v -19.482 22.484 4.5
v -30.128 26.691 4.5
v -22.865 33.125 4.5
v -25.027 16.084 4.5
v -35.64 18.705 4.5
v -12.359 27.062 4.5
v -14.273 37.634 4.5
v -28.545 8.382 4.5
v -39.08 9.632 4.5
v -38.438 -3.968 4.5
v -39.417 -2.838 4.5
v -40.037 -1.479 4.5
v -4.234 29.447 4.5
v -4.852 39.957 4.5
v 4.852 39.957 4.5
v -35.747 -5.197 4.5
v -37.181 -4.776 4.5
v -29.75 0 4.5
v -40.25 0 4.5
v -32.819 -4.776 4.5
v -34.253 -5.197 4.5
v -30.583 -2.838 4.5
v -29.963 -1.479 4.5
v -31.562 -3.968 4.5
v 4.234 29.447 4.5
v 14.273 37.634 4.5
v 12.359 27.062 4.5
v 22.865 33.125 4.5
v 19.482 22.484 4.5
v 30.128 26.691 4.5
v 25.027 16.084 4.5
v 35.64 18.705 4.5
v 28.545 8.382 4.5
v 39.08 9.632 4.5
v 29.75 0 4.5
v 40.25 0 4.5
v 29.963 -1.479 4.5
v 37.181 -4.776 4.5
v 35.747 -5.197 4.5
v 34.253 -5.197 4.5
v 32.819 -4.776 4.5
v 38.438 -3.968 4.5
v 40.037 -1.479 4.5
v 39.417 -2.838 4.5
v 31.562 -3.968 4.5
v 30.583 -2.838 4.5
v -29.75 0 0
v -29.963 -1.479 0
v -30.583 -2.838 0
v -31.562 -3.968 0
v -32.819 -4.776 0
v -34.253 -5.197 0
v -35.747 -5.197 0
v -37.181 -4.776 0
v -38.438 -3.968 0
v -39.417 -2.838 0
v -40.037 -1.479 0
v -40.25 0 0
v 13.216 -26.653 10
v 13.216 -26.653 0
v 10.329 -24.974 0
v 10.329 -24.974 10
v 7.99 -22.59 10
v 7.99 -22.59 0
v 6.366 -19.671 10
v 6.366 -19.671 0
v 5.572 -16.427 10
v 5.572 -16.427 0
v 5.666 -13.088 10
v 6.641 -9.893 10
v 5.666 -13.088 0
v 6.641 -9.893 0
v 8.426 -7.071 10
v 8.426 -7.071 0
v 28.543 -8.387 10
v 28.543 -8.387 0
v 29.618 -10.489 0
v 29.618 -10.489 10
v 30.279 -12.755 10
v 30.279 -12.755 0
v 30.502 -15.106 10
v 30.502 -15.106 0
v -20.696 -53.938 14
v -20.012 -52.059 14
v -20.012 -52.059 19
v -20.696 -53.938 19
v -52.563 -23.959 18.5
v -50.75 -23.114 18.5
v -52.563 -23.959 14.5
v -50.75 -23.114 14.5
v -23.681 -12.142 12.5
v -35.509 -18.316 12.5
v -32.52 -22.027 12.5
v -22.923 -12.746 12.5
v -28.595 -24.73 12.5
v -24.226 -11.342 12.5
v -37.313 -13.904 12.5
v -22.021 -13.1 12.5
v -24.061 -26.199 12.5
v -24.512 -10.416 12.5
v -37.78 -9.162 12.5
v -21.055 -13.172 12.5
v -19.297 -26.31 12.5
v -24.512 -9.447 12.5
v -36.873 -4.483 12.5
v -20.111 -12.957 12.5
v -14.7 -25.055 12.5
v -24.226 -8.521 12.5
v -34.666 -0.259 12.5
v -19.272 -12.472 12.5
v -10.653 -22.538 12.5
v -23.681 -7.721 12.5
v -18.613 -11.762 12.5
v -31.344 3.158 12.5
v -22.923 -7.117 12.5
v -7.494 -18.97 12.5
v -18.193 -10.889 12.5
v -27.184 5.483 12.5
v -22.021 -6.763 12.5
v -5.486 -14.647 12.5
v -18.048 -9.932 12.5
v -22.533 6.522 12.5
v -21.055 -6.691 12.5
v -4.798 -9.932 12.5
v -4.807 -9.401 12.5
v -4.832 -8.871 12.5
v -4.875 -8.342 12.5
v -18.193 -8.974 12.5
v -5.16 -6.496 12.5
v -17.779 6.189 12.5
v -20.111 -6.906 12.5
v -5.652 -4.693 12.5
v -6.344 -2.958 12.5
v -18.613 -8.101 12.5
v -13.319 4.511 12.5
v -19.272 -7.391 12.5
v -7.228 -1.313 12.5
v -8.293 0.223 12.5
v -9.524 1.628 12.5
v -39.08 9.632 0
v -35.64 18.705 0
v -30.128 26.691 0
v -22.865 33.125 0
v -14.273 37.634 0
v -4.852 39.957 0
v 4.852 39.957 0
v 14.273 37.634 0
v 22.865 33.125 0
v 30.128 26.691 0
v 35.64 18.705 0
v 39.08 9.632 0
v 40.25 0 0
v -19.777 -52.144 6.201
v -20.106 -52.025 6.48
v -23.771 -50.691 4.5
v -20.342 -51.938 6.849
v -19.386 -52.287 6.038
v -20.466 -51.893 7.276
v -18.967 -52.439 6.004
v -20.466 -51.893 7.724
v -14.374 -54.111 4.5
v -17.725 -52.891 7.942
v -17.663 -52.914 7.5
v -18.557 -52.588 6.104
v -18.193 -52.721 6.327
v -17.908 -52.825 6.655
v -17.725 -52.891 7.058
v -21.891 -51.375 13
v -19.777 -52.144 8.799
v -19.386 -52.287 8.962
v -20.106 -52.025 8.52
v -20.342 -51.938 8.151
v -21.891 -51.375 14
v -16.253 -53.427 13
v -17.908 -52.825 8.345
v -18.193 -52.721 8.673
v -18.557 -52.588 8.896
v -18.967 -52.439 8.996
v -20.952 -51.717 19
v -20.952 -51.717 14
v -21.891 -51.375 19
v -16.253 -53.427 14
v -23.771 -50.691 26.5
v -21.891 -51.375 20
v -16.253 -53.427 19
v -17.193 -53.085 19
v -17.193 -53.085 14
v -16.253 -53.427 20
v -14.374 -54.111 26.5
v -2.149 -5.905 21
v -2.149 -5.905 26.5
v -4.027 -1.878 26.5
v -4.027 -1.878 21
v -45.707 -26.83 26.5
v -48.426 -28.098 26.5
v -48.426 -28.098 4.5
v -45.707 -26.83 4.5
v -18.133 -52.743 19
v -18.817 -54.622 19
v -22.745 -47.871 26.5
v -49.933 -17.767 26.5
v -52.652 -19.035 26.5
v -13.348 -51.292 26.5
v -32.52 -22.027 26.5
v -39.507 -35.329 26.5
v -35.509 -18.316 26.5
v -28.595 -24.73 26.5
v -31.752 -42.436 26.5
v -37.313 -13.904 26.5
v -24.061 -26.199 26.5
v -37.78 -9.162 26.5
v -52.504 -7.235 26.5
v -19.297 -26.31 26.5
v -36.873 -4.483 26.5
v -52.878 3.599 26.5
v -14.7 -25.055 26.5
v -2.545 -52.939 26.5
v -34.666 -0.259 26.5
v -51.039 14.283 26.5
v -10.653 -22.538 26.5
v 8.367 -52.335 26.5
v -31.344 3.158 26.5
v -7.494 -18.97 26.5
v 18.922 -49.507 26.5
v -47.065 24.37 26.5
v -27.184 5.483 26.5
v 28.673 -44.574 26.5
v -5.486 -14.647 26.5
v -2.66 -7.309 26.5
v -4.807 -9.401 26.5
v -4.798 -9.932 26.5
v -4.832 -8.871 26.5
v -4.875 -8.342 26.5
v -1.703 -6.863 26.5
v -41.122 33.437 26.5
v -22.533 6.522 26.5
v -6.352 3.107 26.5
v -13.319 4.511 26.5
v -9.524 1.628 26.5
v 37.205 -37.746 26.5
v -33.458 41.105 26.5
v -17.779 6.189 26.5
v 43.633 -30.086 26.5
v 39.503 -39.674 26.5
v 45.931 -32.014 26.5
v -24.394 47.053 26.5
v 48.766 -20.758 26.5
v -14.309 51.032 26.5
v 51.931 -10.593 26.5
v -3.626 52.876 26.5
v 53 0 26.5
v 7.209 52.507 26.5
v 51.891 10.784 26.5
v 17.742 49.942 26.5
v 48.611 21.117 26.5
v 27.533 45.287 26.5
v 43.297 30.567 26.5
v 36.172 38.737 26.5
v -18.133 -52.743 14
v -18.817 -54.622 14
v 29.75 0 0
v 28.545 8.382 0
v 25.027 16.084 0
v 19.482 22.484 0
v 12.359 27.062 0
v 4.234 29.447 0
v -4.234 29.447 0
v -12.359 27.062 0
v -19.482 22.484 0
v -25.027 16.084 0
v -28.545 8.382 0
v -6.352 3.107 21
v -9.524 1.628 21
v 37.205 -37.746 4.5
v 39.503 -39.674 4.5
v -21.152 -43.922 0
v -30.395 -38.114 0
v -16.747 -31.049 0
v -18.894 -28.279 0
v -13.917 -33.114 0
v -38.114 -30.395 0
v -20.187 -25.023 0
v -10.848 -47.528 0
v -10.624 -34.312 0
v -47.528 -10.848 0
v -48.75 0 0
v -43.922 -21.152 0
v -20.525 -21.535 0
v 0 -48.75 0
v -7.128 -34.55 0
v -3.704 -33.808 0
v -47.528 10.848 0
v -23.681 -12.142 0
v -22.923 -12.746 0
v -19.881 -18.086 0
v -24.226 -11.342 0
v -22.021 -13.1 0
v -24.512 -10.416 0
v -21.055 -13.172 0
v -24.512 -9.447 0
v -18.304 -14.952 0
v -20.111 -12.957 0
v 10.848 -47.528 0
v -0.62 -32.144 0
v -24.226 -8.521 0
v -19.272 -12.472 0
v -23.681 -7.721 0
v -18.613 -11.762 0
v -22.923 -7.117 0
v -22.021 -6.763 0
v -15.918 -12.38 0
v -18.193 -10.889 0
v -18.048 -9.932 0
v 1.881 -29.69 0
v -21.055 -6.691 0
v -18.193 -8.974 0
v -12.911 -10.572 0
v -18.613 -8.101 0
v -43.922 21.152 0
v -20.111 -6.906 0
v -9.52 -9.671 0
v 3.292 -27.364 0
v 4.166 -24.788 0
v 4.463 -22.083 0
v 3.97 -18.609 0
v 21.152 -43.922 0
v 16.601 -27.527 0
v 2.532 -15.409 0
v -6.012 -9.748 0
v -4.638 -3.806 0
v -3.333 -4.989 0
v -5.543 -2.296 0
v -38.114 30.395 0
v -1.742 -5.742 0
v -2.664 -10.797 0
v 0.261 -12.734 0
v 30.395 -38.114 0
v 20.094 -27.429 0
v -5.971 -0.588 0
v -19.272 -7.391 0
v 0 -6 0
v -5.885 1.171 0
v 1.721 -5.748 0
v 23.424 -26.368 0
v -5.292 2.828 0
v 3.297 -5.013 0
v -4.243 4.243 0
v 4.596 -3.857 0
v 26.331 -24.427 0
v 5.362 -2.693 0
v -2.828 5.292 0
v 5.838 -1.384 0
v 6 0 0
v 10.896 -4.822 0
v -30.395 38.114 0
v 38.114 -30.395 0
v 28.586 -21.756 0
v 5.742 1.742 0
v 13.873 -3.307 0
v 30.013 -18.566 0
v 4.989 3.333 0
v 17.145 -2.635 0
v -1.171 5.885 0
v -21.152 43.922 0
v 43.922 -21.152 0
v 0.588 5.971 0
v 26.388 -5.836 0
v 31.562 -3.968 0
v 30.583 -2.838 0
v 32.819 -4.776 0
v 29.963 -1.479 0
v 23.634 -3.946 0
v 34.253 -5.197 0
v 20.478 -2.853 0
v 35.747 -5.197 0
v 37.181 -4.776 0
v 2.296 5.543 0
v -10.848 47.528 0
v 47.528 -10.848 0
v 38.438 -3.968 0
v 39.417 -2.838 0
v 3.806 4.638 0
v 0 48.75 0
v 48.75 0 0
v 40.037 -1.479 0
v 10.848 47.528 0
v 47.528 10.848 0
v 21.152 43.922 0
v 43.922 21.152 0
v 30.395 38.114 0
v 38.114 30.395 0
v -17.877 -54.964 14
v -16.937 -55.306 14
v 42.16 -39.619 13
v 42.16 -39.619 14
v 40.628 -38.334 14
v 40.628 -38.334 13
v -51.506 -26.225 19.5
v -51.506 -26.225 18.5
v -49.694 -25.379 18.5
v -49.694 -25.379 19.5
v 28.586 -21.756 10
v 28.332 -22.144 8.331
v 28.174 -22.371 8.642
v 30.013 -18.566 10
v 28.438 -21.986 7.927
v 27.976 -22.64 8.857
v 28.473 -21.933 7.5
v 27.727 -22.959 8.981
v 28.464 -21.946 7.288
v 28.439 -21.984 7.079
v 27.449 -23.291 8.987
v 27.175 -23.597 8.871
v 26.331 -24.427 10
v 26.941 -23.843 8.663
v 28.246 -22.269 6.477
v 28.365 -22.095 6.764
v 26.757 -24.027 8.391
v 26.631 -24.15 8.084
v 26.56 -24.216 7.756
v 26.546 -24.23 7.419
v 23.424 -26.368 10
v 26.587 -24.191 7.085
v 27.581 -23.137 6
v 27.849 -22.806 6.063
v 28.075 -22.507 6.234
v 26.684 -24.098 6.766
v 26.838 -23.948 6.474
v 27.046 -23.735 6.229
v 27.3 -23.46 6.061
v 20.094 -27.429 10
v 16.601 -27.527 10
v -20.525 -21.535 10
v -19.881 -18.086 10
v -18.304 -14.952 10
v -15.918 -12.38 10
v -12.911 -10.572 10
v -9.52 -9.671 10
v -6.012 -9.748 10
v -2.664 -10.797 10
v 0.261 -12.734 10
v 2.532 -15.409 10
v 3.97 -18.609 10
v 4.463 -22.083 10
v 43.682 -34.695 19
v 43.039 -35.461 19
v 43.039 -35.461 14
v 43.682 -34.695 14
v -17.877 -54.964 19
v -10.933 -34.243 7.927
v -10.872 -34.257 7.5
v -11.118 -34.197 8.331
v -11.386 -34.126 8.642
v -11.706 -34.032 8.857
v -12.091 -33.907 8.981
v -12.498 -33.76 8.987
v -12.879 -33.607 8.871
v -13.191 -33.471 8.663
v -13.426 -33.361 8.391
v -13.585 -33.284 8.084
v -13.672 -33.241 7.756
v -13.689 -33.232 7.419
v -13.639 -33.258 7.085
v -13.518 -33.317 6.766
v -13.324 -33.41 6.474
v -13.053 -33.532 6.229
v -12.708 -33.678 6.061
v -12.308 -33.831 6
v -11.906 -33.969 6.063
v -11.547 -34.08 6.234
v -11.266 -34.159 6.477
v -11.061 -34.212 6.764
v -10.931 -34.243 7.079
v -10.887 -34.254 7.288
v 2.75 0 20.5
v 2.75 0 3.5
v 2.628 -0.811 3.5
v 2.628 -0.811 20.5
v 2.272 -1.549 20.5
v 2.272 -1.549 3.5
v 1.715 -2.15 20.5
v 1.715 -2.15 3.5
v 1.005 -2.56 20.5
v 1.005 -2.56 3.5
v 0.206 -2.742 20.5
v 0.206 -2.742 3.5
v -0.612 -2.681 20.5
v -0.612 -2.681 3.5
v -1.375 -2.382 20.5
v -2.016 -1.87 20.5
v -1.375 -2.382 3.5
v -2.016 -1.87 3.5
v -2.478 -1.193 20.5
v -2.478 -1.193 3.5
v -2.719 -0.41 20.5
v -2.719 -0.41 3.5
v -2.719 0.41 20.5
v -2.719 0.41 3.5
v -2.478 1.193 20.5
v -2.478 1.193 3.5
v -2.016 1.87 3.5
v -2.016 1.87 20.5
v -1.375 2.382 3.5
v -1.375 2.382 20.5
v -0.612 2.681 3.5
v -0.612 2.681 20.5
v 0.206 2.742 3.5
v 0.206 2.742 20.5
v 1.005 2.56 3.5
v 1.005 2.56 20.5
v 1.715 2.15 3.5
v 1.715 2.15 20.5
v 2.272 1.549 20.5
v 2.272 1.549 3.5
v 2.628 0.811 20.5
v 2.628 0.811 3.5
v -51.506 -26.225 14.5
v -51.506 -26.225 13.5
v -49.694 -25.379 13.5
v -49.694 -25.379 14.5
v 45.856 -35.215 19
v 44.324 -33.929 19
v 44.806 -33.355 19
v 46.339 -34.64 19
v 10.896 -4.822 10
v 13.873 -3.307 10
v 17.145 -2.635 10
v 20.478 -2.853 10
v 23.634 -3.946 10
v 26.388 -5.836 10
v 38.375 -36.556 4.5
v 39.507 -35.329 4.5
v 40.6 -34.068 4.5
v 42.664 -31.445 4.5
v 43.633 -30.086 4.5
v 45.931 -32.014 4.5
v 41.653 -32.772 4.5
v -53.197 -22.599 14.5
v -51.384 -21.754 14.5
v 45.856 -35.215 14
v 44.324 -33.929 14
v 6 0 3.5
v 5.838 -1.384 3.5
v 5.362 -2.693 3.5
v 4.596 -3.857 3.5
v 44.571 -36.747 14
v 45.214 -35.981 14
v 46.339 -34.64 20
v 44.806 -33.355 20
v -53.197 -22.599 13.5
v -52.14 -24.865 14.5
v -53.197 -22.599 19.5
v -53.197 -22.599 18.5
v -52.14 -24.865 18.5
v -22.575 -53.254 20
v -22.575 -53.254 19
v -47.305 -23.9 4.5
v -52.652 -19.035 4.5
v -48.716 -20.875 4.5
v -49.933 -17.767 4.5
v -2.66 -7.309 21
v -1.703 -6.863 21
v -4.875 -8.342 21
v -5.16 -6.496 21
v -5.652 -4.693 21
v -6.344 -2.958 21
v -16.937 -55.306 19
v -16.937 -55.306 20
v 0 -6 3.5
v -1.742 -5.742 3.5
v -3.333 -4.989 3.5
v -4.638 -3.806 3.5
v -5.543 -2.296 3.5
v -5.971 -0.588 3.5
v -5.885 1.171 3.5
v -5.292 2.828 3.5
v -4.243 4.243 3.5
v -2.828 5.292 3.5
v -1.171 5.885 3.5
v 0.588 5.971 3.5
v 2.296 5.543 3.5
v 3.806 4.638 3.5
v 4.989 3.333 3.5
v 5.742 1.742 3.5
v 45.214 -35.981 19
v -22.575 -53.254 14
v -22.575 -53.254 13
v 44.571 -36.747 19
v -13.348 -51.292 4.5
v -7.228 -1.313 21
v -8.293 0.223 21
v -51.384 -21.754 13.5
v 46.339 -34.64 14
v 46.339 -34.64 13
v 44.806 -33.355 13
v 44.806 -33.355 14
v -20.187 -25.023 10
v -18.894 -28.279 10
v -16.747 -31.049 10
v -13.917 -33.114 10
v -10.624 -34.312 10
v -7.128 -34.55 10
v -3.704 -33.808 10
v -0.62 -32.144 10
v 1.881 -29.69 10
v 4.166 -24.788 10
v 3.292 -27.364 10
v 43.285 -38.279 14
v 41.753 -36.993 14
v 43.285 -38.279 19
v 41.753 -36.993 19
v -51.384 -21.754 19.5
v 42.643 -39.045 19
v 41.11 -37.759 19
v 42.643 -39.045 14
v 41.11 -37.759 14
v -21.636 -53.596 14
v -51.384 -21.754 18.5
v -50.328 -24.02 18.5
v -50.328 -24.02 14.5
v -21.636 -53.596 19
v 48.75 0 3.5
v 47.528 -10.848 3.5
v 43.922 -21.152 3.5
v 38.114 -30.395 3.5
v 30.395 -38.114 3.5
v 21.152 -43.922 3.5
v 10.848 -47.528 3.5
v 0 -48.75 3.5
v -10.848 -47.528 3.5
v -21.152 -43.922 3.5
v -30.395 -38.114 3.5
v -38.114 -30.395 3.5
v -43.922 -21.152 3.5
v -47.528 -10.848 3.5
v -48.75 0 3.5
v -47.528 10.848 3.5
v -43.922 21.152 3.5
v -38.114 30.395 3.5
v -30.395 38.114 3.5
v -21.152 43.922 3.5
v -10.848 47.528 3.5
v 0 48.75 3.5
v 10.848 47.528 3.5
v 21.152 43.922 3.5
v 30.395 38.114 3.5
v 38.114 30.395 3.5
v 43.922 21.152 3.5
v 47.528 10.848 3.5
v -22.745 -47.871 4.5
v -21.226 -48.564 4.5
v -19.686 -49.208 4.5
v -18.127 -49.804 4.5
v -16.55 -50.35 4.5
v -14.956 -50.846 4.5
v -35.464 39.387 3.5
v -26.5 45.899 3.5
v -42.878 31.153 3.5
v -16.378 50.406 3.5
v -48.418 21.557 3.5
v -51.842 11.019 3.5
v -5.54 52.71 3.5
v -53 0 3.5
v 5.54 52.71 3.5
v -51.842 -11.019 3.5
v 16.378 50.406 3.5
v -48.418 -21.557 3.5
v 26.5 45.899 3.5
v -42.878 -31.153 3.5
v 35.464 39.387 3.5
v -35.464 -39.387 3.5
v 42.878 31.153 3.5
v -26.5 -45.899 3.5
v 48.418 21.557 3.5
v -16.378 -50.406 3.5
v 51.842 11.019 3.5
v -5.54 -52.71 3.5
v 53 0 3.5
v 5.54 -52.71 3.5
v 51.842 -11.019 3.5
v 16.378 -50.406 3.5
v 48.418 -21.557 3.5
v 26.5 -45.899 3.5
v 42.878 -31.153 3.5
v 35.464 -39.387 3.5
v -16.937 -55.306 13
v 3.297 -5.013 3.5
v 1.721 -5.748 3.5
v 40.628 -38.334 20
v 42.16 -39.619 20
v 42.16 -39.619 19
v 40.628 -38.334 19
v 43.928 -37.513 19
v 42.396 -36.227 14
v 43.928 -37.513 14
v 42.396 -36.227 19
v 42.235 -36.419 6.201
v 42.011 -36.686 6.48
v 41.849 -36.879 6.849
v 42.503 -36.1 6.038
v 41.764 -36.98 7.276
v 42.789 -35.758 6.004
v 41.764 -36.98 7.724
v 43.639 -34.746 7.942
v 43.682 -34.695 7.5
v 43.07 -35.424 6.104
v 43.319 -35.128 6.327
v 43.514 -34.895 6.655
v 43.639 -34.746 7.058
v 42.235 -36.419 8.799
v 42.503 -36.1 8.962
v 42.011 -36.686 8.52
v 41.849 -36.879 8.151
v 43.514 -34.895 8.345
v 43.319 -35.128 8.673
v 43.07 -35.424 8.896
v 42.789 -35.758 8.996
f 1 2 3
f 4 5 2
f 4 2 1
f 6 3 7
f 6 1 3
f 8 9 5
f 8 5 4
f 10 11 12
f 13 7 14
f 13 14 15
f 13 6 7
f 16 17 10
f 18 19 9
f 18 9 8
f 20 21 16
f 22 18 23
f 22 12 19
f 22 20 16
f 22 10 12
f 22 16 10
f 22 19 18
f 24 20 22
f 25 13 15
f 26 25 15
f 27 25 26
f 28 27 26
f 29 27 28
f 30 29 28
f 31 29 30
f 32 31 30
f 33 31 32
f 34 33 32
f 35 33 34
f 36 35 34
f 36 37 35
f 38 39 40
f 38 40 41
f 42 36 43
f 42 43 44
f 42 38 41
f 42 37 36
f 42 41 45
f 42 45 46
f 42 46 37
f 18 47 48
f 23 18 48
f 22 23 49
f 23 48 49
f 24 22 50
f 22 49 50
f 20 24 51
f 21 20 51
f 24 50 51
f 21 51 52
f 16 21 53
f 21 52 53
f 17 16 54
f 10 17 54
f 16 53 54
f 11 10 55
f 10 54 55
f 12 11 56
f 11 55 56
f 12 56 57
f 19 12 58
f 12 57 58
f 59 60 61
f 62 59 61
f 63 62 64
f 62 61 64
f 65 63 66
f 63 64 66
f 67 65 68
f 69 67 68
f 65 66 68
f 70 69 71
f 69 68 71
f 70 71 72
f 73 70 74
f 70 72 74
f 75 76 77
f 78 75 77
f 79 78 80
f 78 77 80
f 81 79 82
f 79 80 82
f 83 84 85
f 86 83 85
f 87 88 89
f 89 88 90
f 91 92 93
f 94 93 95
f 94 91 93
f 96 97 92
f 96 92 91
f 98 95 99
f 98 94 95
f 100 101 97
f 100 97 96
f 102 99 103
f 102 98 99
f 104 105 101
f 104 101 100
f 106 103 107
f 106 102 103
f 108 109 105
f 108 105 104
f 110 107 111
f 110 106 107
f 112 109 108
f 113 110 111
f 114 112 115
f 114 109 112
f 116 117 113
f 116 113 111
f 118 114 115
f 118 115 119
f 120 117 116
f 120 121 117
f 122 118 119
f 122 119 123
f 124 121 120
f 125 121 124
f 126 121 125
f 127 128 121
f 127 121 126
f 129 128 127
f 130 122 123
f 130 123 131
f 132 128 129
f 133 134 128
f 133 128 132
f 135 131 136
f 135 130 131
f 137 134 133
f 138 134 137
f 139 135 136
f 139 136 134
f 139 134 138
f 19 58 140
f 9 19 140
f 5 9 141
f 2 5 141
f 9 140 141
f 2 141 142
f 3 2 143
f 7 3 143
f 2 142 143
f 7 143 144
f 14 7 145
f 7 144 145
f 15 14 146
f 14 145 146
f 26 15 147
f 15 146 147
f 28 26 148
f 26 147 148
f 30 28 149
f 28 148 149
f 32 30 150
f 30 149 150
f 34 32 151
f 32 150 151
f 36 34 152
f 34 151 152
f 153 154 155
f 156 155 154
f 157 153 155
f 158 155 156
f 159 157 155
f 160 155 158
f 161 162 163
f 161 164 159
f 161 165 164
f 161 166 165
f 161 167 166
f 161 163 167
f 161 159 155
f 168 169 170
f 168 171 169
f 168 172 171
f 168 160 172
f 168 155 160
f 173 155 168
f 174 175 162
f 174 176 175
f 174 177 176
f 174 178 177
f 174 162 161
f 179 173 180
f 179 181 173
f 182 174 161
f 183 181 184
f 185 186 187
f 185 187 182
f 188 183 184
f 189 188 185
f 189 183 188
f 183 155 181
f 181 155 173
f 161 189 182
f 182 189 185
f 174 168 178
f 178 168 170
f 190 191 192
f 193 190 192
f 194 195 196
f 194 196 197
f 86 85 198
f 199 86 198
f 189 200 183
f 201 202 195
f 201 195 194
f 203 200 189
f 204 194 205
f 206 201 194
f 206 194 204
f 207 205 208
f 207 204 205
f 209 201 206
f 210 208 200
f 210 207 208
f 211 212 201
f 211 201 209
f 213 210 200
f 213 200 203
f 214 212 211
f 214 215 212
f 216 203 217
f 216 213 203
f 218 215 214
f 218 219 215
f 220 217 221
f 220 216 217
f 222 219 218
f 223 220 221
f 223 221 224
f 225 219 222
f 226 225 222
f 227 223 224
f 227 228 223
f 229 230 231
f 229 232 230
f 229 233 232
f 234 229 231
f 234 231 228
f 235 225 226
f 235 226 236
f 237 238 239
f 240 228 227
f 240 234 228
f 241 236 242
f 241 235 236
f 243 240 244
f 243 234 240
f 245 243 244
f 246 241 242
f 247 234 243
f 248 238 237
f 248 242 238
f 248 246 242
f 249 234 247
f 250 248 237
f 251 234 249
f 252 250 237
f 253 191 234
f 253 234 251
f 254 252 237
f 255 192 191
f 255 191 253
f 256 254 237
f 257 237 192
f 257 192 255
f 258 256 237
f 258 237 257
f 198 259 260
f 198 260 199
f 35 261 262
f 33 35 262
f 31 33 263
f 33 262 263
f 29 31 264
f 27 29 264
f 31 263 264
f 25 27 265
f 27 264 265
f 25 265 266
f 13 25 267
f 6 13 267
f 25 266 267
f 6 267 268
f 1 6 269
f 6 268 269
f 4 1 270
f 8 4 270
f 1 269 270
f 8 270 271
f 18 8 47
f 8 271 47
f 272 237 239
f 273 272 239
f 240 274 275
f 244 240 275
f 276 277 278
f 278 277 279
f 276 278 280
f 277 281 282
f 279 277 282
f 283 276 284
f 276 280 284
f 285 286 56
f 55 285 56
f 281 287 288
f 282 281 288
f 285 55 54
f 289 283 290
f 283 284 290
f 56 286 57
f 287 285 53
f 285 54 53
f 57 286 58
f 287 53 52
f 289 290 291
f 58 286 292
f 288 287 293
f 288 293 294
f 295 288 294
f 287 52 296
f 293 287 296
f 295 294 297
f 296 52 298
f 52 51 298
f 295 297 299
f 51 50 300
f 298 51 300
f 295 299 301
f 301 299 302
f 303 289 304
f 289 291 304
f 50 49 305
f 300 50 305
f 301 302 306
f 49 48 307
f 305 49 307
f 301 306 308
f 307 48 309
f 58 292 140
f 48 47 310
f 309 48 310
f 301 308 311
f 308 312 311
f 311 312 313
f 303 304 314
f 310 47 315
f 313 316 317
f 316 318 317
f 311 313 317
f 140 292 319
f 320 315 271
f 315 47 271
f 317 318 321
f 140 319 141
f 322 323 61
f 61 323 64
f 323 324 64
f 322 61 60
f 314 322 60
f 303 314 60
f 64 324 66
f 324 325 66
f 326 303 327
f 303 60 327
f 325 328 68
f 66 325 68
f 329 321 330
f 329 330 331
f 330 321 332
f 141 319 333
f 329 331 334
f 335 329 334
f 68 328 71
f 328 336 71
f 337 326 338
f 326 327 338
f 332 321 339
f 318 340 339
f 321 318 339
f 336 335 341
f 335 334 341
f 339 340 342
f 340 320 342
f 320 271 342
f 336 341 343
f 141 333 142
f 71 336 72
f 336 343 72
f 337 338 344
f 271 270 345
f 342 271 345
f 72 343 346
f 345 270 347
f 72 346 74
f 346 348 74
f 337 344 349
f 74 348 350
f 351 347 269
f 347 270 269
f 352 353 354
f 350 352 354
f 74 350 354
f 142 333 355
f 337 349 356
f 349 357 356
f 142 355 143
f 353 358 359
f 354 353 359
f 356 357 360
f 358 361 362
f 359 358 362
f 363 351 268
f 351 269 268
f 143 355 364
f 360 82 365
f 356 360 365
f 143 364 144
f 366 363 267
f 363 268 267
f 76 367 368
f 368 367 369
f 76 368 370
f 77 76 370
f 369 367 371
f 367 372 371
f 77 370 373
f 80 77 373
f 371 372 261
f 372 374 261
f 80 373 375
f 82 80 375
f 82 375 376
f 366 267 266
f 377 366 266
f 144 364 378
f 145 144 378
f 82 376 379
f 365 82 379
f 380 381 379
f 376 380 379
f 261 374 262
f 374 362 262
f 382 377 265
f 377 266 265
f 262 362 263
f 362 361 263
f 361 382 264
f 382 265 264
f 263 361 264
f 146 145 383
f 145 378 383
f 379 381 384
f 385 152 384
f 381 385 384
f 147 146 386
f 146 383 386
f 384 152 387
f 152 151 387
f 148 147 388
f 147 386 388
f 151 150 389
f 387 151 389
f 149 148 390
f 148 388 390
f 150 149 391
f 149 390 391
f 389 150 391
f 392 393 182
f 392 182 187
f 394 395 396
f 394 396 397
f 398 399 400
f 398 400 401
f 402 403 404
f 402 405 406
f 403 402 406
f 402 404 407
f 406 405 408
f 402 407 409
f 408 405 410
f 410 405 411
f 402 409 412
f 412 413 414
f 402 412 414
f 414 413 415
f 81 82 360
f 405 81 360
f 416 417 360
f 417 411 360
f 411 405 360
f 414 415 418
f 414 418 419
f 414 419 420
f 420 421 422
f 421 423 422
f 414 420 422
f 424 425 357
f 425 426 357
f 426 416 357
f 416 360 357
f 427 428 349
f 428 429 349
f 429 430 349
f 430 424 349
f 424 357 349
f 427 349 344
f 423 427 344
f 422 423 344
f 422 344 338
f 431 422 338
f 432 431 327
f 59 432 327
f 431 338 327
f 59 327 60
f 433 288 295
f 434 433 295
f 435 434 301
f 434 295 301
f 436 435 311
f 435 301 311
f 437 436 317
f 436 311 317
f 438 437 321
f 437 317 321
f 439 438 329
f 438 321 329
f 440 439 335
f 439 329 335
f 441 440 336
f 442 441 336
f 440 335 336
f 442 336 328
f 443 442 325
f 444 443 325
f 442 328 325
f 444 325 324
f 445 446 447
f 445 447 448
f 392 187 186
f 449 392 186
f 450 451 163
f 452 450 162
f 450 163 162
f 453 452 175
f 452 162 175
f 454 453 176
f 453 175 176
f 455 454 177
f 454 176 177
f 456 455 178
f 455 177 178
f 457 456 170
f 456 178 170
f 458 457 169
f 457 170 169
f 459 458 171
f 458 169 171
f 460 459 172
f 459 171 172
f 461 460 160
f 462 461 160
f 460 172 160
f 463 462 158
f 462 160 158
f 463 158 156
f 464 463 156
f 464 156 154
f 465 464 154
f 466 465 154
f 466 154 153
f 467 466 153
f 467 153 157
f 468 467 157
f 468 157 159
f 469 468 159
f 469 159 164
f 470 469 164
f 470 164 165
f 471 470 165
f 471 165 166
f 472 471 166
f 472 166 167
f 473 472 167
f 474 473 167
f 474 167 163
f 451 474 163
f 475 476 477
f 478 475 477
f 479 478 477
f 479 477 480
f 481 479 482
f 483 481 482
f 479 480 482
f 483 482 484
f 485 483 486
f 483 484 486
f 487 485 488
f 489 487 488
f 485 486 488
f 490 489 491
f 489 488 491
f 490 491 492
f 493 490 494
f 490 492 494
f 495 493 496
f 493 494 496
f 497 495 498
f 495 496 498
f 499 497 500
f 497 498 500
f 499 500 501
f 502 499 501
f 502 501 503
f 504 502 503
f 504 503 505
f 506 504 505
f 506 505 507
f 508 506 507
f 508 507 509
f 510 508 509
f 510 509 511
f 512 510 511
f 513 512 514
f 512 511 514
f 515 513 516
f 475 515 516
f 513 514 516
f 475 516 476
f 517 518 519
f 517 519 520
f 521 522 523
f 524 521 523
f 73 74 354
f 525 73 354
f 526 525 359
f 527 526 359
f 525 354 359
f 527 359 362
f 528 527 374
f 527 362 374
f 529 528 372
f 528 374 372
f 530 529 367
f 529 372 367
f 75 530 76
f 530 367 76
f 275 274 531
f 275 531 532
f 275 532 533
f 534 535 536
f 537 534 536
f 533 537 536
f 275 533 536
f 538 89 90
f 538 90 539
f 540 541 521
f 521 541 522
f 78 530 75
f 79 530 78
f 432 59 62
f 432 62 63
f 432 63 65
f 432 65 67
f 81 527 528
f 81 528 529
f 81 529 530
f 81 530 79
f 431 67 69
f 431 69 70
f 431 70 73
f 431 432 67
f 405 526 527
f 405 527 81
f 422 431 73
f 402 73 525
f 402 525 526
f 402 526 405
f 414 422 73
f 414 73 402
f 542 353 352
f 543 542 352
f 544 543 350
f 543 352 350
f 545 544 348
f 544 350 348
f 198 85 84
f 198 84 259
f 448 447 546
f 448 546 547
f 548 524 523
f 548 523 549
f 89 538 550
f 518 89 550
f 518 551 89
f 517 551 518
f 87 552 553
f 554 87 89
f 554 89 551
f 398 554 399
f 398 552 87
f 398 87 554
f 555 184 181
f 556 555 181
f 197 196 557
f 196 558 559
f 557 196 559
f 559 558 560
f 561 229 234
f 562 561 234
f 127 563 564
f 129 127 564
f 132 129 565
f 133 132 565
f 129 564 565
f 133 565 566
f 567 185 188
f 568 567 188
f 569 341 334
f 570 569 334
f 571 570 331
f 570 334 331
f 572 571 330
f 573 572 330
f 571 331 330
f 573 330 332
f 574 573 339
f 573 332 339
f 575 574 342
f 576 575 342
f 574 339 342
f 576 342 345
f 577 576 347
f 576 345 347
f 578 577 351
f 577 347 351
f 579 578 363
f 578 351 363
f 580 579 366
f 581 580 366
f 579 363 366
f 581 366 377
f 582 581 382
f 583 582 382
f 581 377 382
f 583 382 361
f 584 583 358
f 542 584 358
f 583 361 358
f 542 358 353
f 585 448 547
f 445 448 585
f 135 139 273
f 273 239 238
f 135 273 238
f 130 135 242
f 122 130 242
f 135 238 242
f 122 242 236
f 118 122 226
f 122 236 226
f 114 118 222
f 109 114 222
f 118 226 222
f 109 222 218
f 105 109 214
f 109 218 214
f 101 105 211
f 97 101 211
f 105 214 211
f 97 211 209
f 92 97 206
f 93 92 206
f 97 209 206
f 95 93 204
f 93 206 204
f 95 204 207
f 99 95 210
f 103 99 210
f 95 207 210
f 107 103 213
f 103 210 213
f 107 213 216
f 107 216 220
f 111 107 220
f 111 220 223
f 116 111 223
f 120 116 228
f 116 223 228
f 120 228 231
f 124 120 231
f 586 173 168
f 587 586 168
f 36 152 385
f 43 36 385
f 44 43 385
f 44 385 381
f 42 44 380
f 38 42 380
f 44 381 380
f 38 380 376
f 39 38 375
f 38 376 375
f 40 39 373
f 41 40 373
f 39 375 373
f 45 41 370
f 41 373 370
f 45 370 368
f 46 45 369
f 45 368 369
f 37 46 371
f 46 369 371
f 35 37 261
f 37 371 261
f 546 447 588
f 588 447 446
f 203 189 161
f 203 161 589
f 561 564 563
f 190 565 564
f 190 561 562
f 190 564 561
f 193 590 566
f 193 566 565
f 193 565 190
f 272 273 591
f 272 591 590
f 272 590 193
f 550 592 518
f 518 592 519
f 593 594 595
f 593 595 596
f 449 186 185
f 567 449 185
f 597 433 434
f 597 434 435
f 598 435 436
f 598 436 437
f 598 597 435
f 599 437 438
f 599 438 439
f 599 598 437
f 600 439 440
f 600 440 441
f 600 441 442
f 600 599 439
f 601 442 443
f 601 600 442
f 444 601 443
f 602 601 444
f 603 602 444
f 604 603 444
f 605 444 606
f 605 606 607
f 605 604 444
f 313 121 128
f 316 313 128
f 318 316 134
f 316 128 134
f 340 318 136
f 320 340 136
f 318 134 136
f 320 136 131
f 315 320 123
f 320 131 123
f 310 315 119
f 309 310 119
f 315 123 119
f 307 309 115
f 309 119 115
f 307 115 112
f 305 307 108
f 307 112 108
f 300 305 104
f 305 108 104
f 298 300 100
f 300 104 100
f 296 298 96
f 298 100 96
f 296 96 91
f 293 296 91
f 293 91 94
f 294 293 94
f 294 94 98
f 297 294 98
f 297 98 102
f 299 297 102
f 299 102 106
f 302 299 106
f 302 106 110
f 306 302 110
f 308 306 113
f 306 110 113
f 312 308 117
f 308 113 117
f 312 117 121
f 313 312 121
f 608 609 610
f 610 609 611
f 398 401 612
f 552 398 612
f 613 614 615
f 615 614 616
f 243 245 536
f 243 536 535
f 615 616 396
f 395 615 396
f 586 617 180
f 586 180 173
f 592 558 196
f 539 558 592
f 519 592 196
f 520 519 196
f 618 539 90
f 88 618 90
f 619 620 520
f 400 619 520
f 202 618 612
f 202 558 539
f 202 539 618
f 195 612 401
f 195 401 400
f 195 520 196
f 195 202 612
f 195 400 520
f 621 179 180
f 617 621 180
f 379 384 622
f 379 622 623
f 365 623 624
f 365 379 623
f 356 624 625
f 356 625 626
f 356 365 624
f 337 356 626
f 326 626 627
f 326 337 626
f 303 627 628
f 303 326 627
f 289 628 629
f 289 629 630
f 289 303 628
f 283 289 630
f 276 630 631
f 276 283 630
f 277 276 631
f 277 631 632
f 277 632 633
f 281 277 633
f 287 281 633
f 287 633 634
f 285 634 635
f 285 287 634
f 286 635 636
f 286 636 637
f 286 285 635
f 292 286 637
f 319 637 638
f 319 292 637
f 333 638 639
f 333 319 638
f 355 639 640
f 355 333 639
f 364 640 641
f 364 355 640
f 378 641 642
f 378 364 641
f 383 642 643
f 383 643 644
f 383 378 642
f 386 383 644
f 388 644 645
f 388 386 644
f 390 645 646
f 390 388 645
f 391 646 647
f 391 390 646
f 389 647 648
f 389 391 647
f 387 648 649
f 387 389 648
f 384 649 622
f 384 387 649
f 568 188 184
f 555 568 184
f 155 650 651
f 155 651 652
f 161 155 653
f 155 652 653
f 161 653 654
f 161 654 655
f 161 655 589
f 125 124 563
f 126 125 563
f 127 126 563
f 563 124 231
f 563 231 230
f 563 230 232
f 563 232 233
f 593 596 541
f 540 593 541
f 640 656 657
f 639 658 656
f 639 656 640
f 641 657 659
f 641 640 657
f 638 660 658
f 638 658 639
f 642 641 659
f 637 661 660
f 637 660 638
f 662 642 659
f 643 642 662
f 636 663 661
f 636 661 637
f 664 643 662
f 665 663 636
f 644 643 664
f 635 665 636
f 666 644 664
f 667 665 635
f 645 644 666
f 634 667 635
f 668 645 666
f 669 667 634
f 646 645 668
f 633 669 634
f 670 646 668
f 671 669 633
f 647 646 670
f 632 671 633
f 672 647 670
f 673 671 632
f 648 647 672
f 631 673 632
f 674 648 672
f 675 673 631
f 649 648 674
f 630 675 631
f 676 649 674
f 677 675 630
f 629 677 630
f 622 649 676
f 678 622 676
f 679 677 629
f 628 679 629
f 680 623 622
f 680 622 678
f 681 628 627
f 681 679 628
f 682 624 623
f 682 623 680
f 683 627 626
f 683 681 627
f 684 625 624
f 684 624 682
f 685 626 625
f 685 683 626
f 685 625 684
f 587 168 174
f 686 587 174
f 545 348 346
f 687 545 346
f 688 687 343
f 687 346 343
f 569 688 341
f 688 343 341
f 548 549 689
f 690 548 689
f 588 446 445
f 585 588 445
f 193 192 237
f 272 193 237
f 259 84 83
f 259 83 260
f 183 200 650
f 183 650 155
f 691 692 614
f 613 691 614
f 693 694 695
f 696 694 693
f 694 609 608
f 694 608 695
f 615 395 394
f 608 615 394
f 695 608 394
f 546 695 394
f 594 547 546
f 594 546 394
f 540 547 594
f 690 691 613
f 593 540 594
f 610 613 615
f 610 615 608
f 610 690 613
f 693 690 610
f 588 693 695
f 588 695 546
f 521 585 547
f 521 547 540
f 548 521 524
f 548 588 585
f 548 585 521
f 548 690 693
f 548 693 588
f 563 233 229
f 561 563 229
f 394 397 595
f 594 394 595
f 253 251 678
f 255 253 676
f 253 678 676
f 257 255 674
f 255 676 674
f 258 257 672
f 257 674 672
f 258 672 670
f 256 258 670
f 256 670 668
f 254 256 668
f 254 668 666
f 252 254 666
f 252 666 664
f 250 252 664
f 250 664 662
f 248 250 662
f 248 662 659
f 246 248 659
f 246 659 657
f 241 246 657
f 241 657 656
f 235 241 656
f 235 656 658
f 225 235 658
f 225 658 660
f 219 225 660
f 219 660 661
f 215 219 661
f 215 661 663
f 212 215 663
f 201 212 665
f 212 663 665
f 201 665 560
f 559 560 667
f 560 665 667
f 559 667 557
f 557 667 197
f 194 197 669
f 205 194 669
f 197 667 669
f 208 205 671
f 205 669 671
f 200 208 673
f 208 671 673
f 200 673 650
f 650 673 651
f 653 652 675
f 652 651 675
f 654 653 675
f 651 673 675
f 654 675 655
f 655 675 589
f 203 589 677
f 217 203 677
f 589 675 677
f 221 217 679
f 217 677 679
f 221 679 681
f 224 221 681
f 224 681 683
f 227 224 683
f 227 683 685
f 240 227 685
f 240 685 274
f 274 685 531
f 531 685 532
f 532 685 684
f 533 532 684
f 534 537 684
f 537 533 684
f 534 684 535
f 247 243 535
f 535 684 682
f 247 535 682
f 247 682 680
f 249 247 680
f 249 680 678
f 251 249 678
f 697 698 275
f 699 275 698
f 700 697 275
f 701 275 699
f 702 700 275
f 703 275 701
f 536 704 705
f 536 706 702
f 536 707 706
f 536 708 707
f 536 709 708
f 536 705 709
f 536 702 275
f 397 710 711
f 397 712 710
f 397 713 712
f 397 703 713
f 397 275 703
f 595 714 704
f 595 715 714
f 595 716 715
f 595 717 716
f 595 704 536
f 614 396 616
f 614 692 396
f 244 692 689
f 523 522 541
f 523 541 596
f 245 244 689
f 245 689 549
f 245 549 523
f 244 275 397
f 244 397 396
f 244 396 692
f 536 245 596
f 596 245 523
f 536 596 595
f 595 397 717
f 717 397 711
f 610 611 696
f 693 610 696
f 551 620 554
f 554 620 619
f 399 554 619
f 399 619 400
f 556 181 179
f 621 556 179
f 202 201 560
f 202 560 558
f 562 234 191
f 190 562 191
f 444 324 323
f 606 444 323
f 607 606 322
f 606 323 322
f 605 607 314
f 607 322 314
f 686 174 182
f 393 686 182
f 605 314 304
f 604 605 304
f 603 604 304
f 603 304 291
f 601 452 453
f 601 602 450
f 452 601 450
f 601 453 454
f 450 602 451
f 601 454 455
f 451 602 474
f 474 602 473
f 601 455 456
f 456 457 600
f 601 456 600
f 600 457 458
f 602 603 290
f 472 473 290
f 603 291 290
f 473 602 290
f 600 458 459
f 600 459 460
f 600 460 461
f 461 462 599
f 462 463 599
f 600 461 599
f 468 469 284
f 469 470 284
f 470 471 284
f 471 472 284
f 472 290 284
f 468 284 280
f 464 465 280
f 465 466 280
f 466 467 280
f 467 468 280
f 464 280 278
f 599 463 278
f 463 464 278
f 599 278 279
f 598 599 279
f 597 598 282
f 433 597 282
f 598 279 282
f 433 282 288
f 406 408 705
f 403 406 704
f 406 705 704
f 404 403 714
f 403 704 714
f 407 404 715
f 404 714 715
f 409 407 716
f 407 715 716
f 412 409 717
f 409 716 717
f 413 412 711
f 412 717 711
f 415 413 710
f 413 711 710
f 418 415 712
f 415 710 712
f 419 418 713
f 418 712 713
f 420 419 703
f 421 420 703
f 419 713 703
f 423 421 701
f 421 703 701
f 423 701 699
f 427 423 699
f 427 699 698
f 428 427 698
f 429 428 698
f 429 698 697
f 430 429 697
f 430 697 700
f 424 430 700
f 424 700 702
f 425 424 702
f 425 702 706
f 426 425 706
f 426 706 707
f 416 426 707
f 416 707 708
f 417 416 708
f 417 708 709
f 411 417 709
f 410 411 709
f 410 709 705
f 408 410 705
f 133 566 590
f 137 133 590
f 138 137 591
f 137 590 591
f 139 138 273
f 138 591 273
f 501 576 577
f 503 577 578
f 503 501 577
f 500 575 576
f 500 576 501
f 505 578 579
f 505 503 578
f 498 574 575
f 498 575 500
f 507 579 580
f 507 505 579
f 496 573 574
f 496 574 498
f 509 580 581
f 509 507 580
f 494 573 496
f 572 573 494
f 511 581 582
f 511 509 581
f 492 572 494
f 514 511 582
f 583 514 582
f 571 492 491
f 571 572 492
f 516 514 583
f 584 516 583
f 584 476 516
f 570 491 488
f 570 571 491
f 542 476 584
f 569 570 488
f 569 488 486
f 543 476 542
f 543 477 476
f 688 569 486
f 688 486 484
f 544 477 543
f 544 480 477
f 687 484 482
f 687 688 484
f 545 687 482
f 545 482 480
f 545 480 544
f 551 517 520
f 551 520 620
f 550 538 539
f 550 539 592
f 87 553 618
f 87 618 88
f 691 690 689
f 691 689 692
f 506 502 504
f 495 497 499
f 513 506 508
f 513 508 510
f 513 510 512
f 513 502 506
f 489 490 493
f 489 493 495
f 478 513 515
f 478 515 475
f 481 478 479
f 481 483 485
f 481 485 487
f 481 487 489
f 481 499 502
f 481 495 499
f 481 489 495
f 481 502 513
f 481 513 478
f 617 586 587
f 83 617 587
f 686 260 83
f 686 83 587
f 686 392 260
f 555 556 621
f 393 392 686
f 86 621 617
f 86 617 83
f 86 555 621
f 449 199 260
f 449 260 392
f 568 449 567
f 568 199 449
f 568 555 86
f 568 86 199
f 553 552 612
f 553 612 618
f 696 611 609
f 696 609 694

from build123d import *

# Parameters (mm, degrees)
F0_R      = 53
F1_DEPTH  = 26.5
F2_R      = 53
F2_R_2    = 48.75
F3_DEPTH  = 3.5
F4_R      = 2.75
F5_DEPTH  = 17
F6_DEPTH  = 4.5
F8_DEPTH  = 14
F9_R      = 3.25
F10_DEPTH = 12.5
F11_DEPTH = 10
F12_DEPTH = 22
F13_DEPTH = 5.5
F14_R     = 1.5
F15_DEPTH = 25
F16_R     = 1.5
F17_DEPTH = 25
F19_DEPTH = 2
F14_W     = 2
F14_H     = 5
F20_DEPTH = 2
F16_W     = 1
F16_H     = 5
F21_DEPTH = 2


with BuildPart() as f1:
    # F0 (on Top) → F1 (new body)
    with BuildSketch(Plane.XY):
        Circle(F0_R)
    extrude(amount=F1_DEPTH)

    # F2 (on face) → F3 (cut)
    with BuildSketch(Plane(origin=(0, 0, 0), x_dir=(1, 0, 0), z_dir=(0, 0, -1))):
        Circle(F2_R)
        Circle(F2_R_2, mode=Mode.SUBTRACT)
        with BuildLine():
            ThreePointArc((0, 6), (-4.2426406871, -4.2426406871), (6, 0))
            ThreePointArc((6, 0), (5.6381557247, 2.05212086), (4.5962666587, 3.8567256581))
            Line((4.5962666587, 3.8567256581), (0, 0))
            Line((0, 0), (0, 6))
        make_face()
        with BuildLine():
            Line((0, 0), (4.5962666587, 3.8567256581))
            ThreePointArc((4.5962666587, 3.8567256581), (2.5357095704, 5.4378467222), (0, 6))
            Line((0, 6), (0, 0))
        make_face()
    extrude(amount=-F3_DEPTH, mode=Mode.SUBTRACT)

    # F4 (on face) → F5 (cut)
    with BuildSketch(Plane(origin=(0, 0, 3.5), x_dir=(1, 0, 0), z_dir=(0, 0, -1))):
        Circle(F4_R)
    extrude(amount=-F5_DEPTH, mode=Mode.SUBTRACT)

    # F2 (on face) → F6 (cut)
    with BuildSketch(Plane(origin=(0, 0, 0), x_dir=(1, 0, 0), z_dir=(0, 0, -1))):
        with BuildLine():
            ThreePointArc((-40.25, 5.06e-08), (-35.0000000253, -5.25), (-29.75, 0))
            ThreePointArc((-29.75, 0), (-34.9999999747, 5.25), (-40.25, 5.06e-08))
        make_face()
        with BuildLine():
            ThreePointArc((40.25, 0), (35, -5.25), (29.75, 0))
            ThreePointArc((29.75, 0), (0, -29.75), (-29.75, 0))
            ThreePointArc((-29.75, 0), (-35.0000000253, -5.25), (-40.25, 5.06e-08))
            ThreePointArc((-40.25, 5.06e-08), (-2.53e-08, -40.25), (40.25, 0))
        make_face()
        with BuildLine():
            ThreePointArc((40.25, 0), (35, 5.25), (29.75, 0))
            ThreePointArc((29.75, 0), (35, -5.25), (40.25, 0))
        make_face()
    extrude(amount=-F6_DEPTH, mode=Mode.SUBTRACT)

    # F7 (on face) → F8 (cut)
    with BuildSketch(Plane.XY.offset(26.5)):
        with BuildLine():
            ThreePointArc((-9.5237930297, 1.6275609299), (-36.5712199238, -16.1753957641), (-4.7982329954, -9.9315291509))
            ThreePointArc((-4.7982329954, -9.9315291509), (-4.8174339562, -9.1357508964), (-4.8749921506, -8.3418247275))
            ThreePointArc((-4.8749921506, -8.3418247275), (-5.3803326375, -5.587516237), (-6.3441545093, -2.9583278322))
            ThreePointArc((-6.3441545093, -2.9583278322), (-7.7386969196, -0.529987713), (-9.5237930297, 1.6275609299))
        make_face()
    extrude(amount=-F8_DEPTH, mode=Mode.SUBTRACT)

    # F9 (on face) → F10 (cut)
    with BuildSketch(Plane.XY.offset(12.5)):
        with Locations((-21.2982329954, -9.9315291509)):
            Circle(F9_R)
    extrude(amount=-F10_DEPTH, mode=Mode.SUBTRACT)

    # F2 (on face) → F11 (cut)
    with BuildSketch(Plane(origin=(0, 0, 0), x_dir=(1, 0, 0), z_dir=(0, 0, -1))):
        with BuildLine():
            ThreePointArc((4.4625266318, 22.0827765885), (3.7995194773, 26.099690874), (1.8808305715, 29.6904862938))
            ThreePointArc((1.8808305715, 29.6904862938), (-10.1750992639, 27.9558554684), (-20.525476523, 21.5352574516))
            ThreePointArc((-20.525476523, 21.5352574516), (-7.763648091, 9.5857761597), (4.4625266318, 22.0827765885))
        make_face()
        with BuildLine():
            ThreePointArc((-20.525476523, 21.5352574516), (-10.1750992639, 27.9558554684), (1.8808305715, 29.6904862938))
            ThreePointArc((1.8808305715, 29.6904862938), (-12.3127251597, 33.8289343483), (-20.525476523, 21.5352574516))
        make_face()
        with BuildLine():
            ThreePointArc((13.2163960917, 26.6531306669), (5.8599977512, 18.0754756382), (8.4264888743, 7.0706637066))
            ThreePointArc((8.4264888743, 7.0706637066), (18.8184464785, 2.632197813), (28.5432128195, 8.3873417686))
            ThreePointArc((28.5432128195, 8.3873417686), (22.7898221828, 19.1229313882), (13.2163960917, 26.6531306669))
        make_face()
        with BuildLine():
            ThreePointArc((30.5020444133, 15.1055088276), (24.9457248488, 25.499512003), (13.2163960917, 26.6531306669))
            ThreePointArc((13.2163960917, 26.6531306669), (22.7898221828, 19.1229313882), (28.5432128195, 8.3873417686))
            ThreePointArc((28.5432128195, 8.3873417686), (30.0023486819, 11.6065522029), (30.5020444133, 15.1055088276))
        make_face()
    extrude(amount=-F11_DEPTH, mode=Mode.SUBTRACT)

    # F7 (on face) → F12 (join)
    with BuildSketch(Plane.XY.offset(26.5)):
        with BuildLine():
            Line((-48.4259152046, -28.0982647079), (-45.7069918435, -26.8304099227))
            ThreePointArc((-45.7069918435, -26.8304099227), (-48.0343127129, -22.3987678723), (-49.9331744609, -17.7673320523))
            Line((-49.9331744609, -17.7673320523), (-52.652097822, -19.0351868375))
            Line((-52.652097822, -19.0351868375), (-48.4259152046, -28.0982647079))
        make_face()
        with BuildLine():
            ThreePointArc((-13.3477590818, -51.2916886785), (-15.7549896718, -50.604152996), (-18.1270675963, -49.8037089017))
            ThreePointArc((-18.1270675963, -49.8037089017), (-20.458700255, -48.8921423531), (-22.7446852897, -47.8714872453))
            Line((-22.7446852897, -47.8714872453), (-23.7707457197, -50.6905651076))
            Line((-23.7707457197, -50.6905651076), (-14.3738195118, -54.1107665409))
            Line((-14.3738195118, -54.1107665409), (-13.3477590818, -51.2916886785))
        make_face()
        with BuildLine():
            ThreePointArc((43.6332188846, -30.0855814265), (42.1638253258, -32.1124871957), (40.6003554853, -34.0677433134))
            ThreePointArc((40.6003554853, -34.0677433134), (38.9462977901, -35.9469871956), (37.2053427877, -37.7460258577))
            Line((37.2053427877, -37.7460258577), (39.5034761171, -39.6743886867))
            Line((39.5034761171, -39.6743886867), (45.9313522139, -32.0139442555))
            Line((45.9313522139, -32.0139442555), (43.6332188846, -30.0855814265))
        make_face()
    extrude(amount=-F12_DEPTH)

    # F7 (on face) → F13 (cut)
    with BuildSketch(Plane.XY.offset(26.5)):
        with BuildLine():
            Line((-6.3517157751, 3.106724846), (-9.5237930297, 1.6275609299))
            ThreePointArc((-9.5237930297, 1.6275609299), (-7.7386969196, -0.529987713), (-6.3441545093, -2.9583278322))
            Line((-6.3441545093, -2.9583278322), (-4.0273153355, -1.8779679828))
            Line((-4.0273153355, -1.8779679828), (-6.3517157751, 3.106724846))
        make_face()
        with BuildLine():
            ThreePointArc((-6.3441545093, -2.9583278322), (-5.3803326375, -5.587516237), (-4.8749921506, -8.3418247275))
            Line((-4.8749921506, -8.3418247275), (-2.6602923891, -7.3090932683))
            Line((-2.6602923891, -7.3090932683), (-2.1493473528, -5.9052833183))
            Line((-2.1493473528, -5.9052833183), (-4.0273153355, -1.8779679828))
            Line((-4.0273153355, -1.8779679828), (-6.3441545093, -2.9583278322))
        make_face()
        Polygon((-2.1493473528, -5.9052833183), (-2.6602923891, -7.3090932683), (-1.7029148959, -6.8626608115), align=None)
    extrude(amount=-F13_DEPTH, mode=Mode.SUBTRACT)

    # F14 (on face) → F15 (cut)
    with BuildSketch(Plane(origin=(-19.0722826158, -52.4006658242, 0), x_dir=(0.9396926208, -0.3420201433, 0), z_dir=(-0.3420201433, -0.9396926208, 0))):
        with Locations((0, 7.5)):
            Circle(F14_R)
    extrude(amount=-F15_DEPTH, mode=Mode.SUBTRACT)

    # F16 (on face) → F17 (cut)
    with BuildSketch(Plane(origin=(42.7174141655, -35.8441664711, 0), x_dir=(0.6427876097, 0.7660444431, 0), z_dir=(0.7660444431, -0.6427876097, 0))):
        with Locations((0, 7.5)):
            Circle(F16_R)
    extrude(amount=-F17_DEPTH, mode=Mode.SUBTRACT)

    # F18 (on face) → F19 (join)
    with BuildSketch(Plane(origin=(-50.5390065133, -23.5667257727, 0), x_dir=(0.4226182617, -0.906307787, 0), z_dir=(-0.906307787, -0.4226182617, 0))):
        Polygon((2, 19.5), (-2, 19.5), (-2, 18.5), (-0.5, 18.5), (-0.5, 14.5), (-2, 14.5), (-2, 13.5), (2, 13.5), (2, 14.5), (0.5, 14.5), (0.5, 18.5), (2, 18.5), align=None)
    extrude(amount=F19_DEPTH)

    # F14 (on face) → F20 (join)
    with BuildSketch(Plane(origin=(-19.0722826158, -52.4006658242, 0), x_dir=(0.9396926208, -0.3420201433, 0), z_dir=(-0.3420201433, -0.9396926208, 0))):
        Polygon((3, 20), (-3, 20), (-3, 19), (-2, 19), (-2, 14), (-3, 14), (-3, 13), (3, 13), (3, 14), (2, 14), (2, 19), (3, 19), align=None)
        with Locations((0, 16.5)):
            Rectangle(F14_W, F14_H, mode=Mode.SUBTRACT)
    extrude(amount=F20_DEPTH)

    # F16 (on face) → F21 (join)
    with BuildSketch(Plane(origin=(42.7174141655, -35.8441664711, 0), x_dir=(0.6427876097, 0.7660444431, 0), z_dir=(0.7660444431, -0.6427876097, 0))):
        Polygon((3.25, 20), (-3.25, 20), (-3.25, 19), (-2.5, 19), (-2.5, 14), (-3.25, 14), (-3.25, 13), (3.25, 13), (3.25, 14), (2.5, 14), (2.5, 19), (3.25, 19), align=None)
        with Locations((-1, 16.5)):
            Rectangle(F16_W, F16_H, mode=Mode.SUBTRACT)
        with Locations((1, 16.5)):
            Rectangle(F16_W, F16_H, mode=Mode.SUBTRACT)
    extrude(amount=F21_DEPTH)


solid = f1.part
